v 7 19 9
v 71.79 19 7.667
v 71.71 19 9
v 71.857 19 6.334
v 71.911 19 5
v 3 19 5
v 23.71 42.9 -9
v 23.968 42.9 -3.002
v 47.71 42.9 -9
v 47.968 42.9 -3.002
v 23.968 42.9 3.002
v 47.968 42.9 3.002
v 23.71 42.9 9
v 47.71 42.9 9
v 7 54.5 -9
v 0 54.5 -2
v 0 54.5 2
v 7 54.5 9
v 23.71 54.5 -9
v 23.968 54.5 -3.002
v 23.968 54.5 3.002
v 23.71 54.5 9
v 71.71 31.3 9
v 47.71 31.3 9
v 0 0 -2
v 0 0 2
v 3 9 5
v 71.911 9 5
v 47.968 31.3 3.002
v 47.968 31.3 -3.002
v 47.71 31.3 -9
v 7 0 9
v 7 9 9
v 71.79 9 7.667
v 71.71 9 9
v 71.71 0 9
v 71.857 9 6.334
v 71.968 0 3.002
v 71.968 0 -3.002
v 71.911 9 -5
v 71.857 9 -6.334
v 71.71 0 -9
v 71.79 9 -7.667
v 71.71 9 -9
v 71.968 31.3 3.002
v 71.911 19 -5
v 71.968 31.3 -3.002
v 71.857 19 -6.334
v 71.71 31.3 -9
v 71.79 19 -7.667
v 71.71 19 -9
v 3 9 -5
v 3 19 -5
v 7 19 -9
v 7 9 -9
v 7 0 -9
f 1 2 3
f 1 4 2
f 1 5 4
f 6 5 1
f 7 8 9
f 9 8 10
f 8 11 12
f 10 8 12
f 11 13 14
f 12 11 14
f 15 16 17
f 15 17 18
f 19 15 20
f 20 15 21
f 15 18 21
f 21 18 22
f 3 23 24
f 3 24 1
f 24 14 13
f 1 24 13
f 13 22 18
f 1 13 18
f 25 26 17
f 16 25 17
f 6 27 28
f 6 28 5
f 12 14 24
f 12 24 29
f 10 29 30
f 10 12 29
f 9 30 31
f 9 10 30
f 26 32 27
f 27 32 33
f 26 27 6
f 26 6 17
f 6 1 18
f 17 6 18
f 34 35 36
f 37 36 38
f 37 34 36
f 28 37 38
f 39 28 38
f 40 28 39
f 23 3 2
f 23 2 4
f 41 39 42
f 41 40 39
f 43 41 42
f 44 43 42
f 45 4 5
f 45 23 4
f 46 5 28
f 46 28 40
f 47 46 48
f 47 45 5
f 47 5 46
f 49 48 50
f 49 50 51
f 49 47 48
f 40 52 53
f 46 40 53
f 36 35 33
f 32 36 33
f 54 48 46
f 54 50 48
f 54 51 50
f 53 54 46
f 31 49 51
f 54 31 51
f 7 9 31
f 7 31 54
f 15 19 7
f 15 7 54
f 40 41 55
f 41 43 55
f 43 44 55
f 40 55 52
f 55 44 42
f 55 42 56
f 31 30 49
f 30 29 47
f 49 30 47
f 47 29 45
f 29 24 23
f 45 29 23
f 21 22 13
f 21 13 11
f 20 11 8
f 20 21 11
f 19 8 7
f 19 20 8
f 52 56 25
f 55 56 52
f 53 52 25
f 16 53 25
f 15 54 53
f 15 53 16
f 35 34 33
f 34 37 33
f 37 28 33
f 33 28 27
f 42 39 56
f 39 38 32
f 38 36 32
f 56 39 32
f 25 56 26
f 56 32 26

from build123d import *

# Parameters (mm, degrees)
BOSS_EXTRUDE1_DEPTH = 9
SKETCH3_W           = 4
SKETCH3_H           = 10
CUT_EXTRUDE2_DEPTH  = 91.748278221
CUT_EXTRUDE3_START  = 11.6
CUT_EXTRUDE3_DEPTH  = 11.6
CUT_EXTRUDE7_DEPTH  = 11.6
CUT_EXTRUDE8_START  = -11.6
CUT_EXTRUDE8_DEPTH  = 31.3
CHAMFER1_SIZE       = 7


with BuildPart() as part:
    # Sketch1 → Boss-Extrude1 (new, symmetric)
    with BuildSketch(Plane.XY):
        Polygon((0, 0), (0, 54.5), (24, 54.5), (24, 42.9), (48, 42.9), (48, 31.3), (72, 31.3), (72, 0), align=None)
    extrude(amount=BOSS_EXTRUDE1_DEPTH, both=True)

    # Sketch3 → Cut-Extrude2 (cut, through all)
    with BuildSketch(Plane.ZY):
        with Locations((-7, 14)):
            Rectangle(SKETCH3_W, SKETCH3_H)
        with Locations((7, 14)):
            Rectangle(SKETCH3_W, SKETCH3_H)
    extrude(amount=-CUT_EXTRUDE2_DEPTH, mode=Mode.SUBTRACT)

    # Sketch4 → Cut-Extrude3 (cut)
    with BuildSketch(Plane(origin=(0, 42.9, 0), x_dir=(1, 0, 0), z_dir=(0, 1, 0)).offset(CUT_EXTRUDE3_START)):
        with BuildLine():
            Line((49.710414787, -9), (47.710414787, -9))
            ThreePointArc((47.710414787, -9), (48, 0), (47.710414787, 9))
            Line((47.710414787, 9), (49.710414787, 9))
            Line((49.710414787, 9), (49.710414787, -9))
        make_face()
        with BuildLine():
            Line((23.710414787, 9), (25.710414787, 9))
            Line((25.710414787, 9), (25.710414787, -9))
            Line((25.710414787, -9), (23.710414787, -9))
            ThreePointArc((23.710414787, -9), (24, 0), (23.710414787, 9))
        make_face()
        with BuildLine():
            Line((73.710414787, -9), (71.710414787, -9))
            ThreePointArc((71.710414787, -9), (72, 0), (71.710414787, 9))
            Line((71.710414787, 9), (73.710414787, 9))
            Line((73.710414787, 9), (73.710414787, -9))
        make_face()
    extrude(amount=-CUT_EXTRUDE3_DEPTH, mode=Mode.SUBTRACT)

    # Sketch4<3> → Cut-Extrude7 (cut)
    with BuildSketch(Plane(origin=(0, 42.9, 0), x_dir=(1, 0, 0), z_dir=(0, 1, 0))):
        with BuildLine():
            Line((49.710414787, -9), (47.710414787, -9))
            ThreePointArc((47.710414787, -9), (48, 0), (47.710414787, 9))
            Line((47.710414787, 9), (49.710414787, 9))
            Line((49.710414787, 9), (49.710414787, -9))
        make_face()
    extrude(amount=-CUT_EXTRUDE7_DEPTH, mode=Mode.SUBTRACT)

    # Sketch4<4> → Cut-Extrude8 (cut)
    with BuildSketch(Plane(origin=(0, 42.9, 0), x_dir=(1, 0, 0), z_dir=(0, 1, 0)).offset(CUT_EXTRUDE8_START)):
        with BuildLine():
            Line((73.710414787, -9), (71.710414787, -9))
            ThreePointArc((71.710414787, -9), (72, 0), (71.710414787, 9))
            Line((71.710414787, 9), (73.710414787, 9))
            Line((73.710414787, 9), (73.710414787, -9))
        make_face()
    extrude(amount=-CUT_EXTRUDE8_DEPTH, mode=Mode.SUBTRACT)

    # Chamfer1
    chamfer1_edges = [part.edges().sort_by_distance(p)[0] for p in [
        (0, 36.75, -9),
        (0, 36.75, 9),
    ]]
    chamfer(chamfer1_edges, length=CHAMFER1_SIZE)


solid = part.part
